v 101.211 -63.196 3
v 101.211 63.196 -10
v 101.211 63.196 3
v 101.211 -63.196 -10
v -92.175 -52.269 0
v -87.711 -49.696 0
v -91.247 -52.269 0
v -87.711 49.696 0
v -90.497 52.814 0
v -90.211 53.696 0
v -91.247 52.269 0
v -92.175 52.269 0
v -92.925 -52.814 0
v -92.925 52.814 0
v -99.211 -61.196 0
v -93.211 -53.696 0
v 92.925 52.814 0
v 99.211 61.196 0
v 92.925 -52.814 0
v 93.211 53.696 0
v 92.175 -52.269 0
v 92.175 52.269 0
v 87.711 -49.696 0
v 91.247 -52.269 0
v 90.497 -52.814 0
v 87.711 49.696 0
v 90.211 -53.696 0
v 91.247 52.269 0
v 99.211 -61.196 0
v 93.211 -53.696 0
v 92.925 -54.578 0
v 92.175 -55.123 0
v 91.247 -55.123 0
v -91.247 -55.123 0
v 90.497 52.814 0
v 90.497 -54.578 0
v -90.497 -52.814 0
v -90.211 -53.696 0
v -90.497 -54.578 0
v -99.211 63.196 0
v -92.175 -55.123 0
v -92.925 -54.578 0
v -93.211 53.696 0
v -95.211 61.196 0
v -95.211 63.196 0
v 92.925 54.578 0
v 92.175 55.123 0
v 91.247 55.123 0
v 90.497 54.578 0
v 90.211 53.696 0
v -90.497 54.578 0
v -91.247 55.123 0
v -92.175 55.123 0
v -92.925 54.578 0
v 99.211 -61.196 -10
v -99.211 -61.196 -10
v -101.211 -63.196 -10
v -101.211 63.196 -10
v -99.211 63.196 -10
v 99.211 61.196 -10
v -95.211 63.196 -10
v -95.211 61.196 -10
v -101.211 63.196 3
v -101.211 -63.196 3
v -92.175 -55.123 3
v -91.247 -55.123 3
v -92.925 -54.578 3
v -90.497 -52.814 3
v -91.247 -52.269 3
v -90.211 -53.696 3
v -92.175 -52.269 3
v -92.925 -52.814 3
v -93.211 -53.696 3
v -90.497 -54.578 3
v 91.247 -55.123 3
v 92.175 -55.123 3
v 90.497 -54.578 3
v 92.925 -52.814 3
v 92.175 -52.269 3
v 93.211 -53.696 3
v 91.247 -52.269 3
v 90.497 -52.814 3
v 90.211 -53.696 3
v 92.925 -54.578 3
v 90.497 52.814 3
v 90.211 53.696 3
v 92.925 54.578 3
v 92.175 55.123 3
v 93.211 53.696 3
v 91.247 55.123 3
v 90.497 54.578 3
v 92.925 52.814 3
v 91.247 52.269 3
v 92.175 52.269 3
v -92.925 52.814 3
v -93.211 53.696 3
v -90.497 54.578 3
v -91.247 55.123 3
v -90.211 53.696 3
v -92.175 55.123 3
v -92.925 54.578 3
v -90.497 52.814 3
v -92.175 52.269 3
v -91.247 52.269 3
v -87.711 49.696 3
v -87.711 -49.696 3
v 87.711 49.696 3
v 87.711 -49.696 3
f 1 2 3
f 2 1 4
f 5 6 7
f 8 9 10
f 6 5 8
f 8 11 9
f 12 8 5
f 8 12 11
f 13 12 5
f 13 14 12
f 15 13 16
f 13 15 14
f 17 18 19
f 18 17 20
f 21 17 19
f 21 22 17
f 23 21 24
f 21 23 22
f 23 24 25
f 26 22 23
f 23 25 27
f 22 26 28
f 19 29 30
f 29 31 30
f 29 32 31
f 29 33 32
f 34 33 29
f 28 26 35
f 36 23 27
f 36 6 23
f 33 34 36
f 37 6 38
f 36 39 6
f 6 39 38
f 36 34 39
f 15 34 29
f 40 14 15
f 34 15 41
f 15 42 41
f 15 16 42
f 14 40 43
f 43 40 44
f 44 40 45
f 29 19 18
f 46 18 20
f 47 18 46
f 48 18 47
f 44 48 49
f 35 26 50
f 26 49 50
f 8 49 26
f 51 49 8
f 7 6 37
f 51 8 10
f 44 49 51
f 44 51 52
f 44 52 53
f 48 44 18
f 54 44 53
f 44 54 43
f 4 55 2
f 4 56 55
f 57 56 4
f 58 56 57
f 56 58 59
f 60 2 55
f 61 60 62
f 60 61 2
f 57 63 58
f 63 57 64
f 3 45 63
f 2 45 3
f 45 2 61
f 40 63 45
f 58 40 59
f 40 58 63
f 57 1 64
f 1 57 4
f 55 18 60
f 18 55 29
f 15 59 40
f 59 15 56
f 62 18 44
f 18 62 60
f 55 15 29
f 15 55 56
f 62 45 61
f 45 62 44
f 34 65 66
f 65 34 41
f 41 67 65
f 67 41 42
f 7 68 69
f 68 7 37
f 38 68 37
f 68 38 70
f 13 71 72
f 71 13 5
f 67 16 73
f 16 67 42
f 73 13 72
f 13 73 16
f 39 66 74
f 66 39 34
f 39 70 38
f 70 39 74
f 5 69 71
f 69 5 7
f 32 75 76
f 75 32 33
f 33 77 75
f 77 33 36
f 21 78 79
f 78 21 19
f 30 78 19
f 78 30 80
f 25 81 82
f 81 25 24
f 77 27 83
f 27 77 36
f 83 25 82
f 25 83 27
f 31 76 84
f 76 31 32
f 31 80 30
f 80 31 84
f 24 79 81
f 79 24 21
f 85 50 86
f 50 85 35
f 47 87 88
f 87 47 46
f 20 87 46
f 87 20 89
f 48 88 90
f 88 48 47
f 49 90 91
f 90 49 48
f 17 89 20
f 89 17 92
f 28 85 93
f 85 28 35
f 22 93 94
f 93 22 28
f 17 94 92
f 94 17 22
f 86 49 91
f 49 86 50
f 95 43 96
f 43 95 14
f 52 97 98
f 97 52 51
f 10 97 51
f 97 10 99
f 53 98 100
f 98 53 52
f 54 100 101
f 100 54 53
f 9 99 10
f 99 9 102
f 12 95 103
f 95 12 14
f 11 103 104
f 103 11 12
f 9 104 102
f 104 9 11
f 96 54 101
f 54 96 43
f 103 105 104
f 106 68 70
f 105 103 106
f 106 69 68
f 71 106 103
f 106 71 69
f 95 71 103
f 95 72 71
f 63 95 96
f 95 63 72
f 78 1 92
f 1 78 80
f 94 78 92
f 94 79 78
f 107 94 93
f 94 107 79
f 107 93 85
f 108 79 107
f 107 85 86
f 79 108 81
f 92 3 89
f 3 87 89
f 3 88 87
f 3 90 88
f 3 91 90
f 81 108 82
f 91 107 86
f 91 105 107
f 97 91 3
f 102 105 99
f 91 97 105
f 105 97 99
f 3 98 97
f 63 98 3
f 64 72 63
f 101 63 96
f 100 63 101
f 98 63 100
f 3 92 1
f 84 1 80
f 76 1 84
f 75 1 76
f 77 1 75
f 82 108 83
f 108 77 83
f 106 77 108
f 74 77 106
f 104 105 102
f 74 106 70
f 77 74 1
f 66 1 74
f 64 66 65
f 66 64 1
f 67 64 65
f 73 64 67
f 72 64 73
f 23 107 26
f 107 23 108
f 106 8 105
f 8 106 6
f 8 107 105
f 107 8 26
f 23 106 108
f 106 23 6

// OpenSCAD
// file: ../pills/negative_screw.scad
use <dimensions.scad>

thickness = 3;
module negative_screw() {
    translate([-plate_width()/2 + hole_offset(), -plate_height()/2 + hole_offset(), 0])
        cylinder(h = thickness * 2, r = hole_radius(), center=true);
    translate([plate_width()/2 - hole_offset(), -plate_height()/2 + hole_offset(), 0])
        cylinder(h = thickness * 2, r = hole_radius(), center=true);
    translate([plate_width()/2 - hole_offset(), plate_height()/2 - hole_offset(), 0])
        cylinder(h = thickness * 2, r = hole_radius(), center=true);
    translate([-plate_width()/2 + hole_offset(), plate_height()/2 - hole_offset(), 0])
        cylinder(h = thickness * 2, r = hole_radius(), center=true);
}

negative_screw();
// file: ../pills/dimensions.scad
function plate_width() = 193.422;
function plate_height() = 117.392;
function plate_thickness() = 3;
function separation() = 5;
function led_width() = 10;
function led_height() = 2.5;
function hole_radius() = 1.5;
function hole_offset() = 3.5 + hole_radius();
function separator_thickness() = (led_width()-plate_thickness())/2;

function electronics_width() = 81.3;
function electronics_height() = 50.7;
function electronics_thickness() = 23;
// main file
use <../pills/dimensions.scad>
use <../pills/negative_screw.scad>

thickness = 4;
$fs = 1;
$fa = 0.4;

module led_holder() {
    translate([0, 0, -(led_width()/2)])
    union() {
        difference() {
            cube([
                plate_width() + led_height() * 2 + thickness,
                plate_height() + led_height() * 2 + thickness,
                led_width()
                ], center=true);
            cube([
                plate_width() + led_height() * 2,
                plate_height() + led_height() * 2,
                led_width()*2
                ], center=true);
            cube([
                thickness, thickness, thickness
            ], center=true);
        translate([
                -(plate_width() + led_height() * 2)/2+thickness/2, (plate_height() + led_height() * 2)/2 + 0.001, 0])
            cube([
                thickness, thickness, thickness*3
            ], center=true);
        }

        translate([0, 0, led_width() / 2 + 1.5])
        difference() {
            cube([
                plate_width() + led_height() * 2 + thickness,
                plate_height() + led_height() * 2 + thickness,
                3
                ], center=true);
            cube([
                plate_width() - hole_offset()*4 + 2,
                plate_height() - hole_offset()*4 + 2,
                3*2
                ], center=true);
            negative_screw();
        }
    }
}

led_holder();
